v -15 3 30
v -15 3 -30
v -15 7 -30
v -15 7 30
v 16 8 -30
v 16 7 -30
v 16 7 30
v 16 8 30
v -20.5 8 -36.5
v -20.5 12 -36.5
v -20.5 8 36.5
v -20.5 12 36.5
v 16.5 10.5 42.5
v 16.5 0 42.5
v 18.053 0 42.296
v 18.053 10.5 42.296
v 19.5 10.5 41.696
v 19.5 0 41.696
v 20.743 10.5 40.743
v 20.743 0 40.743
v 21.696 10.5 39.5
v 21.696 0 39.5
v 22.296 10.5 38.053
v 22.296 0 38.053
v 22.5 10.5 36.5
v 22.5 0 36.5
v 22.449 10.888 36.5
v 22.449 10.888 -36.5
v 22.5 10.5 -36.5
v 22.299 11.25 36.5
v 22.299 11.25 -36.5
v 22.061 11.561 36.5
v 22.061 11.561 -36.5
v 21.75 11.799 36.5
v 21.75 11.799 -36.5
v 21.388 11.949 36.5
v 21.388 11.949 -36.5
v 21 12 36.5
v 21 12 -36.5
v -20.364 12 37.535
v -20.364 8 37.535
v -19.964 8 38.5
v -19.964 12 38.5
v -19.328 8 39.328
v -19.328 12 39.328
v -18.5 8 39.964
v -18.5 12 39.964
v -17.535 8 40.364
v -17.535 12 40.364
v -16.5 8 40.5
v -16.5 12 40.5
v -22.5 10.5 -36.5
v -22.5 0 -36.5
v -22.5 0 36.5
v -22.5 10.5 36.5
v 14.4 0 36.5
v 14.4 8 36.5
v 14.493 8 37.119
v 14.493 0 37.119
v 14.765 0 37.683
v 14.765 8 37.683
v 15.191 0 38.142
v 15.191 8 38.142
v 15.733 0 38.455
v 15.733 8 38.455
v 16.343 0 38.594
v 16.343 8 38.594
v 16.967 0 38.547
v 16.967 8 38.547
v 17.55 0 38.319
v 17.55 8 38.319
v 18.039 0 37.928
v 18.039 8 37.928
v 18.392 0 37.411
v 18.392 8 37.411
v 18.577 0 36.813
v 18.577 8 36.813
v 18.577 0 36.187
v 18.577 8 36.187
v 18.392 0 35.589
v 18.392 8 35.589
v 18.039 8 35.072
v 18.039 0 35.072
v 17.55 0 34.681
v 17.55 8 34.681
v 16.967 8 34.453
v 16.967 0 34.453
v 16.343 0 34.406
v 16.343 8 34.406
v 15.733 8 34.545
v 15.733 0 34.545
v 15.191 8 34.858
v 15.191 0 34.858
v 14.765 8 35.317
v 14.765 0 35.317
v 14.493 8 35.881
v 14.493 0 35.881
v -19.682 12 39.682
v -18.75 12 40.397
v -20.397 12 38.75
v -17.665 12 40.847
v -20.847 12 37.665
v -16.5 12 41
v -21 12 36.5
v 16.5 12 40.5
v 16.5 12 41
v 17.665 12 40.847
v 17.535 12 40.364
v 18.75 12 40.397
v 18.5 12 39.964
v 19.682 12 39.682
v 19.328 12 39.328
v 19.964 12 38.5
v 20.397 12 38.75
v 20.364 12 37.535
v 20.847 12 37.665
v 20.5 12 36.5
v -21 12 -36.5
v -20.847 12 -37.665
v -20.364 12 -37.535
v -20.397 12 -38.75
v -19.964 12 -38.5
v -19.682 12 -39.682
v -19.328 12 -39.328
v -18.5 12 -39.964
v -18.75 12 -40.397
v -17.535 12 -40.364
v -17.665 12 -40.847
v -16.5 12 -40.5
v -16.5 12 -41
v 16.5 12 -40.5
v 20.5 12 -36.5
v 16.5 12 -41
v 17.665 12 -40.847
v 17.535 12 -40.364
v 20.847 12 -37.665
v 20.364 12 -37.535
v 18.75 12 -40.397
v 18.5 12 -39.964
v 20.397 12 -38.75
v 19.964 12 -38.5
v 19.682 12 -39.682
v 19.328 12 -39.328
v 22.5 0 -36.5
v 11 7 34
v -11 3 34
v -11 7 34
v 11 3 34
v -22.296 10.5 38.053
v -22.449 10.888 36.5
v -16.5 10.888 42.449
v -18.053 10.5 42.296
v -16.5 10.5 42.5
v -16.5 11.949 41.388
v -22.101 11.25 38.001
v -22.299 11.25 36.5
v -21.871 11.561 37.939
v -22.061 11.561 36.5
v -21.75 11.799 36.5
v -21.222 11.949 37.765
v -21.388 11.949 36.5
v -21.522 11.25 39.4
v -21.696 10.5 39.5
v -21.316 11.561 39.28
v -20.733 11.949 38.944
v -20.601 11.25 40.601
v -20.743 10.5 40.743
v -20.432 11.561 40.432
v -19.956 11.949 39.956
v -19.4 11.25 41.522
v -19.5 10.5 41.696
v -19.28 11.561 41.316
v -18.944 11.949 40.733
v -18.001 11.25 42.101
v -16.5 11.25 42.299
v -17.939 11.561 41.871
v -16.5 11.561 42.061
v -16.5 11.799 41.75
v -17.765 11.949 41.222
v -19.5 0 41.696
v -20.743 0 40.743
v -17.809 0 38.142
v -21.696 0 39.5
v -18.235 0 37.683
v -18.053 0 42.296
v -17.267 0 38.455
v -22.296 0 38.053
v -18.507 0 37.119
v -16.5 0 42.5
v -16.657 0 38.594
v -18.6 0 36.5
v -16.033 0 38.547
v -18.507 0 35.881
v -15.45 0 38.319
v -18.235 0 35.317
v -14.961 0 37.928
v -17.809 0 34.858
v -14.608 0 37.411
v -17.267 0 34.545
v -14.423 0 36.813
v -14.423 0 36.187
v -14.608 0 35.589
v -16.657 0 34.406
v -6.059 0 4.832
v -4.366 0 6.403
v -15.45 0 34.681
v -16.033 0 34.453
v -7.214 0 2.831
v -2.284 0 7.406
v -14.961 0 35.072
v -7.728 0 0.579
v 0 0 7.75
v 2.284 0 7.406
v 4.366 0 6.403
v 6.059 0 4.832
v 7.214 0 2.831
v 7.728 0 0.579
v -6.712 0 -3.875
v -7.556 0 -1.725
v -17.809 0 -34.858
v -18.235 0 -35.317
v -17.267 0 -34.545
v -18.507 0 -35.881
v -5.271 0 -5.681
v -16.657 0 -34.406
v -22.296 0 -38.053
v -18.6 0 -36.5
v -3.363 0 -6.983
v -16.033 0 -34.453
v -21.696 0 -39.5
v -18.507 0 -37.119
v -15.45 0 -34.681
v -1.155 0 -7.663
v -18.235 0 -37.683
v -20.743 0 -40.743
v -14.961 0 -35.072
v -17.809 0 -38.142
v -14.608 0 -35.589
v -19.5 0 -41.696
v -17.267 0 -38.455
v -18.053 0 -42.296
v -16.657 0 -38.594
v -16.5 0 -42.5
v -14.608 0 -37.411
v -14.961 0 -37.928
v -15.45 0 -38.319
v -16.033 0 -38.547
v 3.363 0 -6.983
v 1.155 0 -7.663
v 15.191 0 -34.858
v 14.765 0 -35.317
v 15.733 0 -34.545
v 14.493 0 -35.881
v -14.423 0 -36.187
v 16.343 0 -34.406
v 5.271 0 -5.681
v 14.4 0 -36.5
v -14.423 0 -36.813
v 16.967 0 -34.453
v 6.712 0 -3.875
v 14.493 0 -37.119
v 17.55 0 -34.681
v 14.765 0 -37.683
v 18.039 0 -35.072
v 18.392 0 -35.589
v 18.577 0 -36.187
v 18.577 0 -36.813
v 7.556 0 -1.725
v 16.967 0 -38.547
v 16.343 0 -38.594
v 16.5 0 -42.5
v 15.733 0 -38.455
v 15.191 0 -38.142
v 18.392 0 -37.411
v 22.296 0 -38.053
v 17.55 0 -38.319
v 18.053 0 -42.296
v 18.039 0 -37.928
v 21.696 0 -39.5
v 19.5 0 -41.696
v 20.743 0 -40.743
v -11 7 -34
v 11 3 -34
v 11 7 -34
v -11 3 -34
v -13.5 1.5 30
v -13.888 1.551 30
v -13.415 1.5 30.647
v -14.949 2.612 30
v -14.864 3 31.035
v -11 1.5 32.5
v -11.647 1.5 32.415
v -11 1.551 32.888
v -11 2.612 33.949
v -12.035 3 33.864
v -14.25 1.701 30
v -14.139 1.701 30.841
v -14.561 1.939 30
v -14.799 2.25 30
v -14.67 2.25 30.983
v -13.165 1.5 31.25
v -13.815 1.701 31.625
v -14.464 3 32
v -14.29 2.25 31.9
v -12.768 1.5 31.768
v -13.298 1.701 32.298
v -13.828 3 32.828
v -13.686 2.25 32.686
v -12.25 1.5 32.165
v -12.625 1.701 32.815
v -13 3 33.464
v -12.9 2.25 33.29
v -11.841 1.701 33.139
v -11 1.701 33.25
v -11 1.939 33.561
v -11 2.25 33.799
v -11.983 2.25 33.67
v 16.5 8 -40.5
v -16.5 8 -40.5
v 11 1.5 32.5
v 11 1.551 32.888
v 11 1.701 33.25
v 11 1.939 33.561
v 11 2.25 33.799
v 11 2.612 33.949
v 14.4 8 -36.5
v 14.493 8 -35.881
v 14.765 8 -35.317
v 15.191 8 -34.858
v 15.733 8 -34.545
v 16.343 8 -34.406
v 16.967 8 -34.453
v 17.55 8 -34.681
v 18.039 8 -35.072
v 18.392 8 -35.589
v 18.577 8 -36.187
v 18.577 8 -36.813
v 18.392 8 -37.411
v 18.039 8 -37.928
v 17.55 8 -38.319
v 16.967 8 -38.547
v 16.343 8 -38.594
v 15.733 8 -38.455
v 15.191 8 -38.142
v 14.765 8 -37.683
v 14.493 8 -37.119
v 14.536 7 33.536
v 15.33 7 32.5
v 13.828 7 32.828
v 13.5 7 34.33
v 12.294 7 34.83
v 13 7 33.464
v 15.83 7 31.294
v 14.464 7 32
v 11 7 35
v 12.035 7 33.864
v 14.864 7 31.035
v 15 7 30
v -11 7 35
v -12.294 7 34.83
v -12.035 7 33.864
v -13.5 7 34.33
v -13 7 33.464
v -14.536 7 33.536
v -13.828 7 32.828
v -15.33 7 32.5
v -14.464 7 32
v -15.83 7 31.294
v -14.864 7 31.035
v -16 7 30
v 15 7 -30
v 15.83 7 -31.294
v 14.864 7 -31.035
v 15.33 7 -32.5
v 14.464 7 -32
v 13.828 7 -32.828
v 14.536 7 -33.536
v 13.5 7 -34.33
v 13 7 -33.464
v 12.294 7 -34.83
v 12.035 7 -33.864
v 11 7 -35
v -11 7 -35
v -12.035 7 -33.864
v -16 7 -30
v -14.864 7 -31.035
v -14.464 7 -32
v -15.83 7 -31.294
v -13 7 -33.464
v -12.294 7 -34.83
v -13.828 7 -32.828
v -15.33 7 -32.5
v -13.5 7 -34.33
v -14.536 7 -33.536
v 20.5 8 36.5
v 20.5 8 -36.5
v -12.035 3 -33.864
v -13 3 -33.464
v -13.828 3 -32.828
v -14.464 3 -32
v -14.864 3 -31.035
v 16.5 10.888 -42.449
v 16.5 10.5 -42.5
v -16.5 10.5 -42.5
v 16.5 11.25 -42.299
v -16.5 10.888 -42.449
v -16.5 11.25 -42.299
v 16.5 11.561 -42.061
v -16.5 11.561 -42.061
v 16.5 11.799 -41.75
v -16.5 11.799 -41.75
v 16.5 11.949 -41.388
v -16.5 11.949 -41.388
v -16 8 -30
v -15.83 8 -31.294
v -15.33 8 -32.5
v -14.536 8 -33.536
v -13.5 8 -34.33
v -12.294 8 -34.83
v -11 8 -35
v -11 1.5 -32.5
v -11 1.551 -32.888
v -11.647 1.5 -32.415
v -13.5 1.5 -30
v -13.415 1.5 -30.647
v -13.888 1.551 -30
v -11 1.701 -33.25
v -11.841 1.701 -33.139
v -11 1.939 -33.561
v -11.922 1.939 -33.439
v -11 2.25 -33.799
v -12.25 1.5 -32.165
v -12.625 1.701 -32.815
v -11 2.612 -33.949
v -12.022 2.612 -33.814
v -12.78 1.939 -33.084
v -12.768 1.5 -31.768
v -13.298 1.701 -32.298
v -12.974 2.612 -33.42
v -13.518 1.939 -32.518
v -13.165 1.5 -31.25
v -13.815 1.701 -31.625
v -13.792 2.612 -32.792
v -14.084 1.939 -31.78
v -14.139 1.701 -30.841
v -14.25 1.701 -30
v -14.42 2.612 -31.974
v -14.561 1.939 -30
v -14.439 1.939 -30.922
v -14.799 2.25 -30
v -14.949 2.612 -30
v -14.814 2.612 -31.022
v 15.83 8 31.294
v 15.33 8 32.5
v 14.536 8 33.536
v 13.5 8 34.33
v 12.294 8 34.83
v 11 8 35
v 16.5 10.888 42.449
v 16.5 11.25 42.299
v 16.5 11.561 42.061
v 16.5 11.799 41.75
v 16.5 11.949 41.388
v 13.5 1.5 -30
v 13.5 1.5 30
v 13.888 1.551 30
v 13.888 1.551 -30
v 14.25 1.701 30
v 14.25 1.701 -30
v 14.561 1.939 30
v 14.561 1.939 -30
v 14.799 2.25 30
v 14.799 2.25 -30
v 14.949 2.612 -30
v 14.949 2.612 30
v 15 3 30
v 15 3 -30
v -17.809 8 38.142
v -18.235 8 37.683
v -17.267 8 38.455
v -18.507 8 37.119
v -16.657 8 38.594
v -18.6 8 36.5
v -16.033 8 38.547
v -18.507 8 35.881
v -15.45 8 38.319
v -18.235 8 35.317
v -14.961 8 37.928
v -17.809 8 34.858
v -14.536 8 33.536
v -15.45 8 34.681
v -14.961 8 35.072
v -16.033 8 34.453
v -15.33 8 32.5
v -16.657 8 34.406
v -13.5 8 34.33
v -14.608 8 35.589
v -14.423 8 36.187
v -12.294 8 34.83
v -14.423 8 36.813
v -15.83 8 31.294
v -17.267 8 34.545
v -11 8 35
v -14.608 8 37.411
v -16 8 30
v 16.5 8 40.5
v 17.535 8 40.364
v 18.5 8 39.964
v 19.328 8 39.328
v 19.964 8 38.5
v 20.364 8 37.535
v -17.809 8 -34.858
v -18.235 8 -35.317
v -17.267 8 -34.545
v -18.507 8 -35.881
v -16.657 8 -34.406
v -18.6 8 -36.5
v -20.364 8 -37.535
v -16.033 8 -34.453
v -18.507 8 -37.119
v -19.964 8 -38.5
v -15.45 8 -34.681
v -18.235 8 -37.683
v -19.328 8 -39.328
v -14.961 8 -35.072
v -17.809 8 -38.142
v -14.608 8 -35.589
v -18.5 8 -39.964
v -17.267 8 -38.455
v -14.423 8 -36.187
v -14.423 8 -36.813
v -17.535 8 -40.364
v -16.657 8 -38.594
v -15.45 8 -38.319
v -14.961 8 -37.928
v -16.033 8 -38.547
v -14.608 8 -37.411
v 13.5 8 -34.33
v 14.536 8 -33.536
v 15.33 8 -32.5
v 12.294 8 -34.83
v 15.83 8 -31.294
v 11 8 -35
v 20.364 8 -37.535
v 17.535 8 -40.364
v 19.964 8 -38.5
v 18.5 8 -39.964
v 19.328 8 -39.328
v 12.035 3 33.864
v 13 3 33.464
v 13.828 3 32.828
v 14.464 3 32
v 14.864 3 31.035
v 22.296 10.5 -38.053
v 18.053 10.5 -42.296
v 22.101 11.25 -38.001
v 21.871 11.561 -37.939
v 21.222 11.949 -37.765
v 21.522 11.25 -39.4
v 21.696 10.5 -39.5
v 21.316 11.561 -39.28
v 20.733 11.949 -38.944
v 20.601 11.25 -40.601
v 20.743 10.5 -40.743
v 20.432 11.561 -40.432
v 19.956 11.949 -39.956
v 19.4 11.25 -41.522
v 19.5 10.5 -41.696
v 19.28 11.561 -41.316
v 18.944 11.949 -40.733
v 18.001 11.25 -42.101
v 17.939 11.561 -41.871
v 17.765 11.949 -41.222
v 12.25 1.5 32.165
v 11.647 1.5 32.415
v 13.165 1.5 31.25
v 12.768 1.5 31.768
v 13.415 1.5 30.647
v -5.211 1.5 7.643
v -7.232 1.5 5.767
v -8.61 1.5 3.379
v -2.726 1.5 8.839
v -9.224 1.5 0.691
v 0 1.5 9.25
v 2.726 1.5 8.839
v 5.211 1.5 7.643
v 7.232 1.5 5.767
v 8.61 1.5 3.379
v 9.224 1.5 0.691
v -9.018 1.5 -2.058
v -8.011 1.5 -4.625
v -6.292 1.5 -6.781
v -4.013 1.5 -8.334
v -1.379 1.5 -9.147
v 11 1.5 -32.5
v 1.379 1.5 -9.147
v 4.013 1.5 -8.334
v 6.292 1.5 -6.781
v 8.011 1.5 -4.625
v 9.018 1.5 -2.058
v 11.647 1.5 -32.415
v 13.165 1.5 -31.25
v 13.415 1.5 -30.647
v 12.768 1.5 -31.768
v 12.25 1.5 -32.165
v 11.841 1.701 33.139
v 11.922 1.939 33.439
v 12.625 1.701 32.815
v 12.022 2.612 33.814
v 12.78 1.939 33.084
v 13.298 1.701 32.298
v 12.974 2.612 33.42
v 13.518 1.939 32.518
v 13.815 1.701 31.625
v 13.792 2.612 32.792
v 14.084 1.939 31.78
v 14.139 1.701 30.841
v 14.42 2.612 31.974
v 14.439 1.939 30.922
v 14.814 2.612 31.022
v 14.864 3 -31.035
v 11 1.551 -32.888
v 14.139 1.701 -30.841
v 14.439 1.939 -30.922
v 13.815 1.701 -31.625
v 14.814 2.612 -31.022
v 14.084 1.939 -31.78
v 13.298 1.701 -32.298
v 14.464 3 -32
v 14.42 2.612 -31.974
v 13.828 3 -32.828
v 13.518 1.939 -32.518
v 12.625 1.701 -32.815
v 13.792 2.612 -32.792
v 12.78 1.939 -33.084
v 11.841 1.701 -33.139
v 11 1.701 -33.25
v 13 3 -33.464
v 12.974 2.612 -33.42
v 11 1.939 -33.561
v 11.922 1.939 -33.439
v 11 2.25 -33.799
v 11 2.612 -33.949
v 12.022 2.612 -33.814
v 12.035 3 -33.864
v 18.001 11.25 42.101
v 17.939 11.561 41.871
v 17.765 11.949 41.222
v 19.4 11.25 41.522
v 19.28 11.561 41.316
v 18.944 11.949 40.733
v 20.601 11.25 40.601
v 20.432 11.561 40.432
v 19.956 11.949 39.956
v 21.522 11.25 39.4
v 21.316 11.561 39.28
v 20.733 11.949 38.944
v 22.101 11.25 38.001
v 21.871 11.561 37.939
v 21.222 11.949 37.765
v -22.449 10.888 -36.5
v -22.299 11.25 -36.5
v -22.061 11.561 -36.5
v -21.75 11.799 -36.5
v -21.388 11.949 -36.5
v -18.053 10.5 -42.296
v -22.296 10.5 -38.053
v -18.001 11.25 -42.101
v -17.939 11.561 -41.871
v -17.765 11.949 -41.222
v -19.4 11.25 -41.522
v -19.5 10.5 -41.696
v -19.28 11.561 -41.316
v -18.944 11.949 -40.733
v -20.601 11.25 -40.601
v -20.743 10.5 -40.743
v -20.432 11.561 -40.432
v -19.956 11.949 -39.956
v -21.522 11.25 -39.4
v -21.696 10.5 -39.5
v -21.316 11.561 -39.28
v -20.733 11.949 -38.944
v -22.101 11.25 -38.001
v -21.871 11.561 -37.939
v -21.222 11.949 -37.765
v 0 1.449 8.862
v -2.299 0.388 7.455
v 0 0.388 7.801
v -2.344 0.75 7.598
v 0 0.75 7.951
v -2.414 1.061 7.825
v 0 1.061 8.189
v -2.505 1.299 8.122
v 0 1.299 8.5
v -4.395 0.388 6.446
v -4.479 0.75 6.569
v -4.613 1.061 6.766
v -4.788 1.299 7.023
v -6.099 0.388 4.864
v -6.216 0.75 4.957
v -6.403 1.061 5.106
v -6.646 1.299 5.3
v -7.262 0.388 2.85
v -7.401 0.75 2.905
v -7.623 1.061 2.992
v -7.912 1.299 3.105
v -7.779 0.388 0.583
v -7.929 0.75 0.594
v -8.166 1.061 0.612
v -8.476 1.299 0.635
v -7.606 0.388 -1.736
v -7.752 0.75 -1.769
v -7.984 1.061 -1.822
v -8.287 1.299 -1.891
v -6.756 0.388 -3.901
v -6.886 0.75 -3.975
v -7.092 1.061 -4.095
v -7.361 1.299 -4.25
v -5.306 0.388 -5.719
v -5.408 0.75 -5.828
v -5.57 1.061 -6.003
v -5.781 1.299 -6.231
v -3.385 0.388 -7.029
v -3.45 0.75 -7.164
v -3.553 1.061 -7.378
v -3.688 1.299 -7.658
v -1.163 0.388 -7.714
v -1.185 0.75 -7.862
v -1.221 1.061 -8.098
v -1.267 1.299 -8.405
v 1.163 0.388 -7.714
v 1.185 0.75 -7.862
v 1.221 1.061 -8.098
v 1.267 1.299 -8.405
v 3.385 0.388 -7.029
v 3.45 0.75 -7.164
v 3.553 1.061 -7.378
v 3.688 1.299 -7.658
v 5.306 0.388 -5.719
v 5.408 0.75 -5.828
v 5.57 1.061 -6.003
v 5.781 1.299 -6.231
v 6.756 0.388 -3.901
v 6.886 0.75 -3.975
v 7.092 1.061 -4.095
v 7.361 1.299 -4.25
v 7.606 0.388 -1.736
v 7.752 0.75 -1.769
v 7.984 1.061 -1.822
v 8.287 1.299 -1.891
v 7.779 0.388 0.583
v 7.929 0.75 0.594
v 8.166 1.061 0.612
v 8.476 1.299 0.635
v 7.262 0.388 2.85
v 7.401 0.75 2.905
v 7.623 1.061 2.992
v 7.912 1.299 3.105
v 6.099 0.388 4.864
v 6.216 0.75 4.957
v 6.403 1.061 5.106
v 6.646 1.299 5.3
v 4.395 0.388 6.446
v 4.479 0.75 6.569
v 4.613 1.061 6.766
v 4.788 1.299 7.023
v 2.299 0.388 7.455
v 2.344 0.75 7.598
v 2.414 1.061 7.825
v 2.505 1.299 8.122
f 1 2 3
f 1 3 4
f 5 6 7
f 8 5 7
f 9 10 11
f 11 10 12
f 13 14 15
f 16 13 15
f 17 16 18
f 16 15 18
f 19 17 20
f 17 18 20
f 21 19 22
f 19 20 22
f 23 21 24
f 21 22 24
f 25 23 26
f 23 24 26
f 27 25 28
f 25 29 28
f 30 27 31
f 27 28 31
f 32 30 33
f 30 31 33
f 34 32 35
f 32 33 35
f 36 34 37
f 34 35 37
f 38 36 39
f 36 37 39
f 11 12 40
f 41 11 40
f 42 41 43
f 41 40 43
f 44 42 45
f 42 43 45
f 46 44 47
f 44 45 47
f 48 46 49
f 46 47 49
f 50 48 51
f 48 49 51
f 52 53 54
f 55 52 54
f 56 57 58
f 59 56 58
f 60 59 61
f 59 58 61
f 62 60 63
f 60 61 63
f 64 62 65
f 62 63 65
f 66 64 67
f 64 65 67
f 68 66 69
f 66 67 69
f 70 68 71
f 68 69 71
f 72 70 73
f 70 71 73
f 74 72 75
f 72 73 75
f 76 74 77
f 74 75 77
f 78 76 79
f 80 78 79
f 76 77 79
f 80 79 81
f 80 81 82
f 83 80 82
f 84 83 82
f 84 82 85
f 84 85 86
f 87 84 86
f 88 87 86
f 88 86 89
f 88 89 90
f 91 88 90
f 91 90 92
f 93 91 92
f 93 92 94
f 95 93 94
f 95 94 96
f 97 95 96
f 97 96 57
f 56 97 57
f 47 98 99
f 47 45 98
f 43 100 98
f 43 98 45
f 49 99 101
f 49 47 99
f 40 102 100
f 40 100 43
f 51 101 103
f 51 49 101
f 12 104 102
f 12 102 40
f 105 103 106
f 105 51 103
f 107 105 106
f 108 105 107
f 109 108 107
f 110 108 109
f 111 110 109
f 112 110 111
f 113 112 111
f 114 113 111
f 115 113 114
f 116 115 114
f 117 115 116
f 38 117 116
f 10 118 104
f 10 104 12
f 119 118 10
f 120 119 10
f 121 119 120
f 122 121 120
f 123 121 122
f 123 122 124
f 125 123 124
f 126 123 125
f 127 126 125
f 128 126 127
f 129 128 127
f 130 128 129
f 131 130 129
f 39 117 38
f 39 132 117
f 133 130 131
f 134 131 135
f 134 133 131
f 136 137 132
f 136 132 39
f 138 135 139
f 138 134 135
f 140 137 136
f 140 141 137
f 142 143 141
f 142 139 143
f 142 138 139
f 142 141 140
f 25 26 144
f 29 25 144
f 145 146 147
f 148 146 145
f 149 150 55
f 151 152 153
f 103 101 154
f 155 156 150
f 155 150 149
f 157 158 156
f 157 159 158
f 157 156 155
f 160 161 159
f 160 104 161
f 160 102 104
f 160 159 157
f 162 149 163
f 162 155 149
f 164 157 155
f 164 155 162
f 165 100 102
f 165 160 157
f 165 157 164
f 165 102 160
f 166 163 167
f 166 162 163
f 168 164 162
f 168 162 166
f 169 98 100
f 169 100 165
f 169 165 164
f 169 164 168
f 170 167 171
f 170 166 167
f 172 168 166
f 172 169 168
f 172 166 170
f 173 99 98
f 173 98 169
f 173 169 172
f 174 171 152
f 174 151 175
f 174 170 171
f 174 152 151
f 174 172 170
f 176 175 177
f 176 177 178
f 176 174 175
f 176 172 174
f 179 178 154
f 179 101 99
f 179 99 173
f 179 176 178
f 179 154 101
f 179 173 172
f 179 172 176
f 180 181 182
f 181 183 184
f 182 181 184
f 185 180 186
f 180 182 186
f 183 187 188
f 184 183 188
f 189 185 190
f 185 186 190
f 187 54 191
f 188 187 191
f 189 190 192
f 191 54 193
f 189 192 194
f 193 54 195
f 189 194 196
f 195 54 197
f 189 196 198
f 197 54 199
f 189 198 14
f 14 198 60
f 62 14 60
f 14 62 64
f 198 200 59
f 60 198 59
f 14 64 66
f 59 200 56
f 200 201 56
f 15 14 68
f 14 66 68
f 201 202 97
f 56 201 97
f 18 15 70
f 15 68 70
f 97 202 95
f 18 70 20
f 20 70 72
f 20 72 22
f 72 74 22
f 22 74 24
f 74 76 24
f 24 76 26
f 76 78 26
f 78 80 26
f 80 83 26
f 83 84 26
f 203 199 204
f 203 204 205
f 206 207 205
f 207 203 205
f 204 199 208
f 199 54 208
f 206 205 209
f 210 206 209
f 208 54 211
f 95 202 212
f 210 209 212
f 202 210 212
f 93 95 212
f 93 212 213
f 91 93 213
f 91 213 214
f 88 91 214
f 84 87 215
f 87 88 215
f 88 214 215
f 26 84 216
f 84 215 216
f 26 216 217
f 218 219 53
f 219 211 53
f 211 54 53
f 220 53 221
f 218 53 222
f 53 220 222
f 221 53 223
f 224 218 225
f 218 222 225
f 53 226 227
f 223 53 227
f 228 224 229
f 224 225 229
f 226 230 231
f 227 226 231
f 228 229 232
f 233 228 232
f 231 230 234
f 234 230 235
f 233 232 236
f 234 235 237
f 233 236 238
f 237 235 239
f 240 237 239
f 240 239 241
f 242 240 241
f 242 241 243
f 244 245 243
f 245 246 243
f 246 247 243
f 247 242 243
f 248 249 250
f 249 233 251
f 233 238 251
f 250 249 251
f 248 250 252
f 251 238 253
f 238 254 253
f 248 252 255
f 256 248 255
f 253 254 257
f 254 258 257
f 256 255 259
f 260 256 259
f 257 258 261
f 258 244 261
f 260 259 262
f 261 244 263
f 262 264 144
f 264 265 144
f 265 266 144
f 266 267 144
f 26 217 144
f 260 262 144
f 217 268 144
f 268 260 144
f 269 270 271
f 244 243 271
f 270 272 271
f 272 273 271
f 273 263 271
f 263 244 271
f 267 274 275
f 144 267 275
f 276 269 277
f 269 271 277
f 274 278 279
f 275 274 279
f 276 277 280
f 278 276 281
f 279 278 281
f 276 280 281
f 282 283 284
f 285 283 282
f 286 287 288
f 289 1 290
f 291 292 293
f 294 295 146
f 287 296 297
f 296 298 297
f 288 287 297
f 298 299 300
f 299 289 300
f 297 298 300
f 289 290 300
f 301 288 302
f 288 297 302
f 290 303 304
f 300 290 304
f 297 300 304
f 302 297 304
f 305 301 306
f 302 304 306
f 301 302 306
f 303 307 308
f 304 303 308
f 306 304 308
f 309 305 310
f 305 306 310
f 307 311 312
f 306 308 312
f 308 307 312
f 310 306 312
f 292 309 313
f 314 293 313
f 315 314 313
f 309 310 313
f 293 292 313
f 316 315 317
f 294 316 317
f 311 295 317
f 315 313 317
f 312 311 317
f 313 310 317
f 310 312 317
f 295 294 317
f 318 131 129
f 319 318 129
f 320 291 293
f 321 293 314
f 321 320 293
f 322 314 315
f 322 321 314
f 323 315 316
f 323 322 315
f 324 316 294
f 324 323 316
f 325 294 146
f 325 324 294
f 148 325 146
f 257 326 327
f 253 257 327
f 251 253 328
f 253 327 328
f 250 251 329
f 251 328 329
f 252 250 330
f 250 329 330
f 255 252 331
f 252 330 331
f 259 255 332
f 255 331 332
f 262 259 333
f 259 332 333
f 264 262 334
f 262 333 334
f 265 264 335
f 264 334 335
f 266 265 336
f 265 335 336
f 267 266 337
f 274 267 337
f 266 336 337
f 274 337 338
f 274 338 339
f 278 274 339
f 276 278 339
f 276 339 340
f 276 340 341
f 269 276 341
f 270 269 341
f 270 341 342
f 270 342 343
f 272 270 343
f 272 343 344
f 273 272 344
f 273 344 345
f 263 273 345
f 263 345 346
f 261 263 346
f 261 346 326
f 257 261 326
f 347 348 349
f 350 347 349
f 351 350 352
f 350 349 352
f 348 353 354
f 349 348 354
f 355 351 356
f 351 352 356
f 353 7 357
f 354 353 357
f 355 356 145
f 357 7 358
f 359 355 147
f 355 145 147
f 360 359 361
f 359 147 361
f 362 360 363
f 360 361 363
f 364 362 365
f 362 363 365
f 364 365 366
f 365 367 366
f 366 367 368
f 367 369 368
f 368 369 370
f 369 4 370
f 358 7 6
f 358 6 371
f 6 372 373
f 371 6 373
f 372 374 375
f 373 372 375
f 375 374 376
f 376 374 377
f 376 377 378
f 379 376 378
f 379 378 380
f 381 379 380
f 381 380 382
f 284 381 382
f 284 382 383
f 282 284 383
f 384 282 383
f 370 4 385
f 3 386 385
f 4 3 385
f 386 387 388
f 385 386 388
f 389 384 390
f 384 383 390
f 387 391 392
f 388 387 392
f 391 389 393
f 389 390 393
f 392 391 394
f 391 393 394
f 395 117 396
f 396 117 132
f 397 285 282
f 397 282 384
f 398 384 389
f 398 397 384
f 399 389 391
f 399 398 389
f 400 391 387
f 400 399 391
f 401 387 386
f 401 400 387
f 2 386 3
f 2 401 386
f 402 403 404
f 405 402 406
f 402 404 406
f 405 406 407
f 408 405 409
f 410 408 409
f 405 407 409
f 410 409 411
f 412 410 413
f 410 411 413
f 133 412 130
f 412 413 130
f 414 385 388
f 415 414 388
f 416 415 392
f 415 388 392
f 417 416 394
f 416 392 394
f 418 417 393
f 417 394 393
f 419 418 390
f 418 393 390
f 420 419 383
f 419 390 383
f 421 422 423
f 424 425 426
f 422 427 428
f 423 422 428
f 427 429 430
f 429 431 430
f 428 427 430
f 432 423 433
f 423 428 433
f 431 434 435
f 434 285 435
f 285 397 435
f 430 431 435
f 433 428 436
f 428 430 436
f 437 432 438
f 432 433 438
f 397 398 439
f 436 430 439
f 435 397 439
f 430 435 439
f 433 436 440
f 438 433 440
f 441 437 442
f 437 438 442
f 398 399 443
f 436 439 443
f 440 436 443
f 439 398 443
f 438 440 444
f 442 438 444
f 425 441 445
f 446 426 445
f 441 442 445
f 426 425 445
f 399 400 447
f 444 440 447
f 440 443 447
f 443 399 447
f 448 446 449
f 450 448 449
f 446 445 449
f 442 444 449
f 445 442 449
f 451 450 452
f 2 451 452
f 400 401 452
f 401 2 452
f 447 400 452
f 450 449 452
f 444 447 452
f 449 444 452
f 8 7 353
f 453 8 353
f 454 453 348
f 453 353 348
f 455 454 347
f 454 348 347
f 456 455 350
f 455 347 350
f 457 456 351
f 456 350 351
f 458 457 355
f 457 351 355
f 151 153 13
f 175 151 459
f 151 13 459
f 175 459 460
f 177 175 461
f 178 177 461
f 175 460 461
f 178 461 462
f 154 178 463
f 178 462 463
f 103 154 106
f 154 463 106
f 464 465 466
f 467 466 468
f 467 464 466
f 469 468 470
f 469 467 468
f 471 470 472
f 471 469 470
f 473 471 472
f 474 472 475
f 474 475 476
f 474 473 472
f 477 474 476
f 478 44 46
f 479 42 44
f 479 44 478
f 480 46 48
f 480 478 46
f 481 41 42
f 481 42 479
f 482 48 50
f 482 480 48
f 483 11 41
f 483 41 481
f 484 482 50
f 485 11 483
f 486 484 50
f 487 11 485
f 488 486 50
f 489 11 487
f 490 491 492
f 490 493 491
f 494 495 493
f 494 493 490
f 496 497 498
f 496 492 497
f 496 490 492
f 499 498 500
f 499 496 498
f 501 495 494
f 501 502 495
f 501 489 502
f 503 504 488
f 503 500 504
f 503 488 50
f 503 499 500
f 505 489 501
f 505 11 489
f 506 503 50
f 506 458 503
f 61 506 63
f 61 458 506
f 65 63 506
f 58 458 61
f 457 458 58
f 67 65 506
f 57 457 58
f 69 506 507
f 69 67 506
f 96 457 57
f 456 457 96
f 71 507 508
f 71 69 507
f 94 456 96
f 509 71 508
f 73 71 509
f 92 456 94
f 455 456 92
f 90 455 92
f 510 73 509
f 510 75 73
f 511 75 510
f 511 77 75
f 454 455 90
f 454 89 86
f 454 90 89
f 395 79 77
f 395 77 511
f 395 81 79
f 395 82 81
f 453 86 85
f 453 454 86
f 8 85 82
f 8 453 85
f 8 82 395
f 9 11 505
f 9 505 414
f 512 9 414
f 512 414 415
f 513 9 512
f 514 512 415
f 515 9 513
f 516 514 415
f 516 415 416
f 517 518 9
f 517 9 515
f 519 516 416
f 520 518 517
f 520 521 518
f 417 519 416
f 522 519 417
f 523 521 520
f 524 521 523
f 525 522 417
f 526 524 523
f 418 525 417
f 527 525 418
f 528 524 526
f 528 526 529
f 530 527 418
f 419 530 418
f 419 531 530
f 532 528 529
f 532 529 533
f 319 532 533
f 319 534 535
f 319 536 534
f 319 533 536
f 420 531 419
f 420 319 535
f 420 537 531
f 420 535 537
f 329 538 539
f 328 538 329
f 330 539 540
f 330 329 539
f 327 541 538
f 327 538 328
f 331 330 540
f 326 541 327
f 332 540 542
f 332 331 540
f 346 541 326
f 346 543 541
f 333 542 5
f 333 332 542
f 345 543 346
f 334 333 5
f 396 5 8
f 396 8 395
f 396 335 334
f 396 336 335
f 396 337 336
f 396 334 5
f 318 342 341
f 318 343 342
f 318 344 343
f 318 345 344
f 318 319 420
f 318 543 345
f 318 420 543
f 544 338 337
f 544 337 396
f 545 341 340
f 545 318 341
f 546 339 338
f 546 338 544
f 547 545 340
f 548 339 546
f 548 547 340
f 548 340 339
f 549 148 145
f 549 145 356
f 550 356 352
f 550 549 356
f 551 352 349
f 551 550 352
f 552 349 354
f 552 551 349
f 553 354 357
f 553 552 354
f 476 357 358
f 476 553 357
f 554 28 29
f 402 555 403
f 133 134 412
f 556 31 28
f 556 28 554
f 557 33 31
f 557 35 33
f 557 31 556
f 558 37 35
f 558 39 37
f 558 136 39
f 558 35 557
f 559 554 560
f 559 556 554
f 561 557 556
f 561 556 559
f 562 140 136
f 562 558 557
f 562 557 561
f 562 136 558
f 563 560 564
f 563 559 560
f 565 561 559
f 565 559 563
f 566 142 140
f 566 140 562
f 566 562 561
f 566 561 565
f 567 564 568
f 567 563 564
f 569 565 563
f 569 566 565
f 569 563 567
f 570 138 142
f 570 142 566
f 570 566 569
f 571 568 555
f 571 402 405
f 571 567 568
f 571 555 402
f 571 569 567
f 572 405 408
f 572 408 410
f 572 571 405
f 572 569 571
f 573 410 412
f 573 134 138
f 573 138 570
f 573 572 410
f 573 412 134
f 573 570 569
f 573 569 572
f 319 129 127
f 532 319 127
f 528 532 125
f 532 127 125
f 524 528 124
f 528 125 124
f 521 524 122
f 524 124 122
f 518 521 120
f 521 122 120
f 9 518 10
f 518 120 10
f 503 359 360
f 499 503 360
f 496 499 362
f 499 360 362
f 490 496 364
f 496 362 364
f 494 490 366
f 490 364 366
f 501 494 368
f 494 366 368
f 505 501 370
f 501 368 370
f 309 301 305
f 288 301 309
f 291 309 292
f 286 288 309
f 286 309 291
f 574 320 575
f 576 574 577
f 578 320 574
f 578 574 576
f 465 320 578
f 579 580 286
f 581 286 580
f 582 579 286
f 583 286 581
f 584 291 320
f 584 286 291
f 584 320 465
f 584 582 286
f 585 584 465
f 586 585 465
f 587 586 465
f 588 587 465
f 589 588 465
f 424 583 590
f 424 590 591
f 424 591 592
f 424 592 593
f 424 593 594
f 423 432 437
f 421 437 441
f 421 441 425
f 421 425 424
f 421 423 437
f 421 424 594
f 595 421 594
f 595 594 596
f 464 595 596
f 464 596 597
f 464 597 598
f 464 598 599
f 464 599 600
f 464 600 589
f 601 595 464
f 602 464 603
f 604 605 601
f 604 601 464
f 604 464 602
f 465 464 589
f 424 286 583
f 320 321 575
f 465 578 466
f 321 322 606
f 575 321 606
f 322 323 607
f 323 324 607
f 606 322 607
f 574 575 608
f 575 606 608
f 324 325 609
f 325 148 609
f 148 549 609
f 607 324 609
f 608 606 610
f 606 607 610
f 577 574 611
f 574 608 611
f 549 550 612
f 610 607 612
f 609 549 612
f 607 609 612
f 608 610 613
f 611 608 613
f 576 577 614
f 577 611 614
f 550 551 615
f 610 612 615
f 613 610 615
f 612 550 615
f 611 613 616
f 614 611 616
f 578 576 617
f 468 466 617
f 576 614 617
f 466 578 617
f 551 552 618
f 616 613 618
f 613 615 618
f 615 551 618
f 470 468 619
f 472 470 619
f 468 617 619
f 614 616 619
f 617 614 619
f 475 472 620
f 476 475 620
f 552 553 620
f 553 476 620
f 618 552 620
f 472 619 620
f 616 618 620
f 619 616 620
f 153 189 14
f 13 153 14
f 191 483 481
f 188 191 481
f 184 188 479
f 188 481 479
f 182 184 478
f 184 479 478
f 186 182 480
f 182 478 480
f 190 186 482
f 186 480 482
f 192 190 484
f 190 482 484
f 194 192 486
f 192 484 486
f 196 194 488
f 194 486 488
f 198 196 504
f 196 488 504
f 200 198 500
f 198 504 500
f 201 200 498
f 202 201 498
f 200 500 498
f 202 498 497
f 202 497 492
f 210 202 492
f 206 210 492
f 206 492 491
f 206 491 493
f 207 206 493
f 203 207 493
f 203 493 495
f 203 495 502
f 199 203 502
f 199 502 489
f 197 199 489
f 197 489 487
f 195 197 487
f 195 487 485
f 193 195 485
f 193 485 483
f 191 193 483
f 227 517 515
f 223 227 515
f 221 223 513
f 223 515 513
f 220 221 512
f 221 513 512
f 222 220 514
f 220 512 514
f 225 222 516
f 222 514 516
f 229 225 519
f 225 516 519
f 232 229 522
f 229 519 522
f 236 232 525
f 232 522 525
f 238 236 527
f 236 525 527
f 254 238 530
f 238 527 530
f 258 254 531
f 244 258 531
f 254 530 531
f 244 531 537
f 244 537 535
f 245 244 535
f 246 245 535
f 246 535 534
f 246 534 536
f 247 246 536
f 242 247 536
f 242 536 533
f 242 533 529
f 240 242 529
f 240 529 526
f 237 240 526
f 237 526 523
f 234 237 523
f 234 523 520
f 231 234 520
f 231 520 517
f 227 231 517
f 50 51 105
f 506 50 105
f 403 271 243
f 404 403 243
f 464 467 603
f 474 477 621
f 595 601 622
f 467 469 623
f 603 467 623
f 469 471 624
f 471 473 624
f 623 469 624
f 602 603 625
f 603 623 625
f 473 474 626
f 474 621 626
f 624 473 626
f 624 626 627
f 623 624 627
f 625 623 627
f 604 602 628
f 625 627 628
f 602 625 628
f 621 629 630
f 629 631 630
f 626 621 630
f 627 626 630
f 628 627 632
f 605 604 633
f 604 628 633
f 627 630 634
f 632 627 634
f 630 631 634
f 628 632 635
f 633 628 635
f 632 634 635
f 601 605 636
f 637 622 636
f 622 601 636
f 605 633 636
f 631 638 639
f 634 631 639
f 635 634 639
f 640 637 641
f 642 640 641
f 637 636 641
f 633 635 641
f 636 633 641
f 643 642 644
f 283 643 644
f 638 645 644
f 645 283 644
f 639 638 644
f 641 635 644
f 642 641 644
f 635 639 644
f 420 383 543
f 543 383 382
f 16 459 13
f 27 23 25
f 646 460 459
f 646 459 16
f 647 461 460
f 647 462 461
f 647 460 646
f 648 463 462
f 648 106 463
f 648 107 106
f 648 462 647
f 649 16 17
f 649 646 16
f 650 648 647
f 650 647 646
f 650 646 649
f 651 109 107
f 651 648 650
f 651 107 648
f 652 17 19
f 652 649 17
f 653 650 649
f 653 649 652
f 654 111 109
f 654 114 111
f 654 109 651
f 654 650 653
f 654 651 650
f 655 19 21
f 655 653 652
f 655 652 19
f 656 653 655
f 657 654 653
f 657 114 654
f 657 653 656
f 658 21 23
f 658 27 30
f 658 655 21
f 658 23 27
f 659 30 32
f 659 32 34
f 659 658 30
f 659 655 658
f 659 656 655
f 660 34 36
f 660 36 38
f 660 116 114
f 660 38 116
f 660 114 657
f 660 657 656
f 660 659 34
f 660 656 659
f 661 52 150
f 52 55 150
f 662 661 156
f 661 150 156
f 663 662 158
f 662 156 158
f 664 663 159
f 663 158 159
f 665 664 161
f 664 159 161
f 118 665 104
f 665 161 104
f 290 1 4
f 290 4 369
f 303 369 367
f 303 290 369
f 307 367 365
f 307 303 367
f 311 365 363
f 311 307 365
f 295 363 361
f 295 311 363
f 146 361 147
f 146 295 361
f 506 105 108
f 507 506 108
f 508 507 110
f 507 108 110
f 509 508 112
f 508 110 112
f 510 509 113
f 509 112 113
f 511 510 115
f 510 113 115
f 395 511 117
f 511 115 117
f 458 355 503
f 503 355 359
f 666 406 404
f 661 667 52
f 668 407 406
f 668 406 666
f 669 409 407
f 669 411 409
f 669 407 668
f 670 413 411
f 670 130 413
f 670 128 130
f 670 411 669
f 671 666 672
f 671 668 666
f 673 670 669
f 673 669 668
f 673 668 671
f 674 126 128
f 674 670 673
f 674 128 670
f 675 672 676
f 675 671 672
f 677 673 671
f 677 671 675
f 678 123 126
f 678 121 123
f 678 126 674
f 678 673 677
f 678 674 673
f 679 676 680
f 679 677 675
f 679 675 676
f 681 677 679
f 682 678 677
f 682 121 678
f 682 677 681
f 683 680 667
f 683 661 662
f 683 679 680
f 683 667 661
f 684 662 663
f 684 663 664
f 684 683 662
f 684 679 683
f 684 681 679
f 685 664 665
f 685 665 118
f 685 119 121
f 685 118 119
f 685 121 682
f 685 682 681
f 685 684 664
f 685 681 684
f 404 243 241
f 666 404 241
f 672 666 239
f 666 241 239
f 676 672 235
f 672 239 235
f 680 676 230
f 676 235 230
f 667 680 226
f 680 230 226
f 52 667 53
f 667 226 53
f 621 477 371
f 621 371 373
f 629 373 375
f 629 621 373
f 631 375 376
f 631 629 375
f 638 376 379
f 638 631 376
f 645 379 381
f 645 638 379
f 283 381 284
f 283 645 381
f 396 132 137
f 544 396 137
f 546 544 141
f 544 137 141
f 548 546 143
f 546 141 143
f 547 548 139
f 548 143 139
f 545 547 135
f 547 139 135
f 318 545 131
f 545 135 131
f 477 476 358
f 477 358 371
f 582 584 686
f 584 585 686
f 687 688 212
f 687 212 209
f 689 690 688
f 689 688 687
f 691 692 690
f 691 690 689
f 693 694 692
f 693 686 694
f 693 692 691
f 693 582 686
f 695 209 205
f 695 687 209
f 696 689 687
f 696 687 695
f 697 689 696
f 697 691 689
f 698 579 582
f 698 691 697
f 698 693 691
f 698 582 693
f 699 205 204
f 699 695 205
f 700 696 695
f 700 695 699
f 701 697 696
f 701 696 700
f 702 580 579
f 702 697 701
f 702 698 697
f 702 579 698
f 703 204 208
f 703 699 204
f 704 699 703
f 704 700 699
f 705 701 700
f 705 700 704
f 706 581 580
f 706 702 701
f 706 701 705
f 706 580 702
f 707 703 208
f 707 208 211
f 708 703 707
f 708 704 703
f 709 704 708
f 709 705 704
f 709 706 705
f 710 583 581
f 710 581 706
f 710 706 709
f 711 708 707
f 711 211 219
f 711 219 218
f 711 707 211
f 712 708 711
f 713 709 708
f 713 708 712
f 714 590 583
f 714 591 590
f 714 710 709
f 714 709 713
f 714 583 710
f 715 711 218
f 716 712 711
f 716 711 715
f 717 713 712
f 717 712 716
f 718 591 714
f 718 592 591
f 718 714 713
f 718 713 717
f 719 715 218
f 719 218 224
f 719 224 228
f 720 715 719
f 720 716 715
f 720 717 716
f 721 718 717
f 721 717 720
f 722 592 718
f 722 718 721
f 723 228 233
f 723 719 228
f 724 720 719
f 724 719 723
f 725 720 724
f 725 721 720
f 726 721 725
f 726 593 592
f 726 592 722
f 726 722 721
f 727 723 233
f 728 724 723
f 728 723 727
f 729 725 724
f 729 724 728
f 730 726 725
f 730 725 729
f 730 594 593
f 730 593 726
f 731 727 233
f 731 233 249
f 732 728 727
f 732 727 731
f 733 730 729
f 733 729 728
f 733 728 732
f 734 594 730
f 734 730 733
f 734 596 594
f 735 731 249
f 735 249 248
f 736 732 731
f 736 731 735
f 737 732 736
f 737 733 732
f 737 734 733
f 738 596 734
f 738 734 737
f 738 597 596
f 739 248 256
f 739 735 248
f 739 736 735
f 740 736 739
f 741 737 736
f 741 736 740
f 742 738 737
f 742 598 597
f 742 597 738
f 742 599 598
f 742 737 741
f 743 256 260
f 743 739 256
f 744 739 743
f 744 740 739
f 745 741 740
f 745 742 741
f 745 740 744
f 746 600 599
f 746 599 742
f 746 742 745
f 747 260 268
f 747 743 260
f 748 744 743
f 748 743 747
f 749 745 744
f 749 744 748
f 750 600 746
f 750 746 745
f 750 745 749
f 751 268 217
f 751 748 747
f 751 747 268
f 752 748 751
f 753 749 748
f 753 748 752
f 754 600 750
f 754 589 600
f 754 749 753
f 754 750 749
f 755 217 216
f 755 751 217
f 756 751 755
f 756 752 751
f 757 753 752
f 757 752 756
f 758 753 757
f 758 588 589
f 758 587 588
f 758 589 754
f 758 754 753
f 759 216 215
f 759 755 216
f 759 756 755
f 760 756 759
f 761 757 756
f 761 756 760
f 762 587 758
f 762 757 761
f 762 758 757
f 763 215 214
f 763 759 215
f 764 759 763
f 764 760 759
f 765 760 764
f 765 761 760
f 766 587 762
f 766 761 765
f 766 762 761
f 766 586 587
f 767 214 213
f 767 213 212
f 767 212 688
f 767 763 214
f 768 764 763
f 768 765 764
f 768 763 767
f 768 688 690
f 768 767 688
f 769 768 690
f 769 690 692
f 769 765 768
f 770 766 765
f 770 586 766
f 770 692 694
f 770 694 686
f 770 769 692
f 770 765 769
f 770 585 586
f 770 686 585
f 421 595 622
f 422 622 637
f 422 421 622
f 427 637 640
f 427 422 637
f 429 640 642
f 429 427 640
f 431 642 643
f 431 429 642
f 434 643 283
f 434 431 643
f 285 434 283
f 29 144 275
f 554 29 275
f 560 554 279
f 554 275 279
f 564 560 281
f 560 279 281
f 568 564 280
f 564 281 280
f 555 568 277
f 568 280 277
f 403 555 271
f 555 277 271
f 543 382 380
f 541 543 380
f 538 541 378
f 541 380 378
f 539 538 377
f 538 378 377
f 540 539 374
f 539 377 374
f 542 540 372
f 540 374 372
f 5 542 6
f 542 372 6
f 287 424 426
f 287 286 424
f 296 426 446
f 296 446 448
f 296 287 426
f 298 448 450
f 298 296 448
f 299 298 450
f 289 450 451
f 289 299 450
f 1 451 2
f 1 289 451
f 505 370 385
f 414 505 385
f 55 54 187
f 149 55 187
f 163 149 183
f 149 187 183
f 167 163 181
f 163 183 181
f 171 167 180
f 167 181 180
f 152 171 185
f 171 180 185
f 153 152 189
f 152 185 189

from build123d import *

# Parameters (mm, degrees)
BOSS_EXTRUDE1_DEPTH        = 12
CUT_EXTRUDE1_DEPTH         = 4
SKETCH3_R                  = 7.75
CUT_EXTRUDE2_DEPTH         = 50.563091106
CUT_EXTRUDE3_DEPTH         = 49.595267259
CUT_EXTRUDE4_DEPTH         = 50.221438419
F_4_2_4_2_DIAMETER_HOLE1_D = 4.2
FILLET1_R                  = 1.5
FILLET2_R                  = 1.5


with BuildPart() as part:
    # Sketch1 → Boss-Extrude1 (new body)
    with BuildSketch(Plane(origin=(0, 0, 0), x_dir=(1, 0, 0), z_dir=(0, 1, 0))):
        with BuildLine():
            Line((-16.5, -42.5), (16.5, -42.5))
            ThreePointArc((16.5, -42.5), (20.742640687, -40.742640687), (22.5, -36.5))
            Line((22.5, -36.5), (22.5, 36.5))
            ThreePointArc((22.5, 36.5), (20.742640687, 40.742640687), (16.5, 42.5))
            Line((16.5, 42.5), (-16.5, 42.5))
            ThreePointArc((-16.5, 42.5), (-20.742640687, 40.742640687), (-22.5, 36.5))
            Line((-22.5, 36.5), (-22.5, -36.5))
            ThreePointArc((-22.5, -36.5), (-20.742640687, -40.742640687), (-16.5, -42.5))
        make_face()
    extrude(amount=BOSS_EXTRUDE1_DEPTH)

    # Sketch2 → Cut-Extrude1 (cut)
    with BuildSketch(Plane(origin=(0, 12, 0), x_dir=(1, 0, 0), z_dir=(0, 1, 0))):
        with BuildLine():
            Line((-16.5, -40.5), (16.5, -40.5))
            ThreePointArc((16.5, -40.5), (19.328427125, -39.328427125), (20.5, -36.5))
            Line((20.5, -36.5), (20.5, 36.5))
            ThreePointArc((20.5, 36.5), (19.328427125, 39.328427125), (16.5, 40.5))
            Line((16.5, 40.5), (-16.5, 40.5))
            ThreePointArc((-16.5, 40.5), (-19.328427125, 39.328427125), (-20.5, 36.5))
            Line((-20.5, 36.5), (-20.5, -36.5))
            ThreePointArc((-20.5, -36.5), (-19.328427125, -39.328427125), (-16.5, -40.5))
        make_face()
    extrude(amount=-CUT_EXTRUDE1_DEPTH, mode=Mode.SUBTRACT)

    # Sketch3 → Cut-Extrude2 (cut, through all)
    with BuildSketch(Plane(origin=(0, 0, 0), x_dir=(1, 0, 0), z_dir=(0, 1, 0))):
        with Locations(Location((0, 0, 0), (0, 0, 270))):
            Circle(SKETCH3_R)
    extrude(amount=CUT_EXTRUDE2_DEPTH, mode=Mode.SUBTRACT)

    # Sketch4 → Cut-Extrude3 (cut, through all)
    with BuildSketch(Plane(origin=(0, 7, 0), x_dir=(1, 0, 0), z_dir=(0, 1, 0))):
        with BuildLine():
            Line((-16, -30), (-16, 30))
            ThreePointArc((-16, 30), (-14.535533906, 33.535533906), (-11, 35))
            Line((-11, 35), (11, 35))
            ThreePointArc((11, 35), (14.535533906, 33.535533906), (16, 30))
            Line((16, 30), (16, -30))
            ThreePointArc((16, -30), (14.535533906, -33.535533906), (11, -35))
            Line((11, -35), (-11, -35))
            ThreePointArc((-11, -35), (-14.535533906, -33.535533906), (-16, -30))
        make_face()
    extrude(amount=CUT_EXTRUDE3_DEPTH, mode=Mode.SUBTRACT)

    # Sketch6 → Cut-Extrude4 (cut, through all)
    with BuildSketch(Plane(origin=(0, 1.5, 0), x_dir=(1, 0, 0), z_dir=(0, 1, 0))):
        with BuildLine():
            Line((-11, -34), (11, -34))
            ThreePointArc((11, -34), (13.828427125, -32.828427125), (15, -30))
            Line((15, -30), (15, 30))
            ThreePointArc((15, 30), (13.828427125, 32.828427125), (11, 34))
            Line((11, 34), (-11, 34))
            ThreePointArc((-11, 34), (-13.828427125, 32.828427125), (-15, 30))
            Line((-15, 30), (-15, -30))
            ThreePointArc((-15, -30), (-13.828427125, -32.828427125), (-11, -34))
        make_face()
    extrude(amount=CUT_EXTRUDE4_DEPTH, mode=Mode.SUBTRACT)

    # Ø4.2 (4.2) Diameter Hole1 (through all)
    with Locations(Plane.XZ):
        with Locations((-16.5, 36.5), (16.5, 36.5), (16.5, -36.5), (-16.5, -36.5)):
            Hole(F_4_2_4_2_DIAMETER_HOLE1_D / 2)

    # Fillet1
    fillet1_edges = [part.edges().sort_by_distance(p)[0] for p in [
        (20.742640687, 12, 40.742640687),
        (22.5, 12, 0),
        (20.742640687, 12, -40.742640687),
        (0, 12, -42.5),
        (-20.742640687, 12, -40.742640687),
        (-22.5, 12, 0),
        (-20.742640687, 12, 40.742640687),
        (0, 12, 42.5),
    ]]
    fillet(fillet1_edges, radius=FILLET1_R)

    # Fillet2
    fillet2_edges = [part.edges().sort_by_distance(p)[0] for p in [
        (0, 1.5, -7.75),
        (-13.828427125, 1.5, 32.828427125),
        (0, 1.5, 34),
        (13.828427125, 1.5, 32.828427125),
        (15, 1.5, 0),
        (13.828427125, 1.5, -32.828427125),
        (0, 1.5, -34),
        (-13.828427125, 1.5, -32.828427125),
        (-15, 1.5, 0),
    ]]
    fillet(fillet2_edges, radius=FILLET2_R - 0.0001)  # a hair under: the kernel refuses the full size


solid = part.part
